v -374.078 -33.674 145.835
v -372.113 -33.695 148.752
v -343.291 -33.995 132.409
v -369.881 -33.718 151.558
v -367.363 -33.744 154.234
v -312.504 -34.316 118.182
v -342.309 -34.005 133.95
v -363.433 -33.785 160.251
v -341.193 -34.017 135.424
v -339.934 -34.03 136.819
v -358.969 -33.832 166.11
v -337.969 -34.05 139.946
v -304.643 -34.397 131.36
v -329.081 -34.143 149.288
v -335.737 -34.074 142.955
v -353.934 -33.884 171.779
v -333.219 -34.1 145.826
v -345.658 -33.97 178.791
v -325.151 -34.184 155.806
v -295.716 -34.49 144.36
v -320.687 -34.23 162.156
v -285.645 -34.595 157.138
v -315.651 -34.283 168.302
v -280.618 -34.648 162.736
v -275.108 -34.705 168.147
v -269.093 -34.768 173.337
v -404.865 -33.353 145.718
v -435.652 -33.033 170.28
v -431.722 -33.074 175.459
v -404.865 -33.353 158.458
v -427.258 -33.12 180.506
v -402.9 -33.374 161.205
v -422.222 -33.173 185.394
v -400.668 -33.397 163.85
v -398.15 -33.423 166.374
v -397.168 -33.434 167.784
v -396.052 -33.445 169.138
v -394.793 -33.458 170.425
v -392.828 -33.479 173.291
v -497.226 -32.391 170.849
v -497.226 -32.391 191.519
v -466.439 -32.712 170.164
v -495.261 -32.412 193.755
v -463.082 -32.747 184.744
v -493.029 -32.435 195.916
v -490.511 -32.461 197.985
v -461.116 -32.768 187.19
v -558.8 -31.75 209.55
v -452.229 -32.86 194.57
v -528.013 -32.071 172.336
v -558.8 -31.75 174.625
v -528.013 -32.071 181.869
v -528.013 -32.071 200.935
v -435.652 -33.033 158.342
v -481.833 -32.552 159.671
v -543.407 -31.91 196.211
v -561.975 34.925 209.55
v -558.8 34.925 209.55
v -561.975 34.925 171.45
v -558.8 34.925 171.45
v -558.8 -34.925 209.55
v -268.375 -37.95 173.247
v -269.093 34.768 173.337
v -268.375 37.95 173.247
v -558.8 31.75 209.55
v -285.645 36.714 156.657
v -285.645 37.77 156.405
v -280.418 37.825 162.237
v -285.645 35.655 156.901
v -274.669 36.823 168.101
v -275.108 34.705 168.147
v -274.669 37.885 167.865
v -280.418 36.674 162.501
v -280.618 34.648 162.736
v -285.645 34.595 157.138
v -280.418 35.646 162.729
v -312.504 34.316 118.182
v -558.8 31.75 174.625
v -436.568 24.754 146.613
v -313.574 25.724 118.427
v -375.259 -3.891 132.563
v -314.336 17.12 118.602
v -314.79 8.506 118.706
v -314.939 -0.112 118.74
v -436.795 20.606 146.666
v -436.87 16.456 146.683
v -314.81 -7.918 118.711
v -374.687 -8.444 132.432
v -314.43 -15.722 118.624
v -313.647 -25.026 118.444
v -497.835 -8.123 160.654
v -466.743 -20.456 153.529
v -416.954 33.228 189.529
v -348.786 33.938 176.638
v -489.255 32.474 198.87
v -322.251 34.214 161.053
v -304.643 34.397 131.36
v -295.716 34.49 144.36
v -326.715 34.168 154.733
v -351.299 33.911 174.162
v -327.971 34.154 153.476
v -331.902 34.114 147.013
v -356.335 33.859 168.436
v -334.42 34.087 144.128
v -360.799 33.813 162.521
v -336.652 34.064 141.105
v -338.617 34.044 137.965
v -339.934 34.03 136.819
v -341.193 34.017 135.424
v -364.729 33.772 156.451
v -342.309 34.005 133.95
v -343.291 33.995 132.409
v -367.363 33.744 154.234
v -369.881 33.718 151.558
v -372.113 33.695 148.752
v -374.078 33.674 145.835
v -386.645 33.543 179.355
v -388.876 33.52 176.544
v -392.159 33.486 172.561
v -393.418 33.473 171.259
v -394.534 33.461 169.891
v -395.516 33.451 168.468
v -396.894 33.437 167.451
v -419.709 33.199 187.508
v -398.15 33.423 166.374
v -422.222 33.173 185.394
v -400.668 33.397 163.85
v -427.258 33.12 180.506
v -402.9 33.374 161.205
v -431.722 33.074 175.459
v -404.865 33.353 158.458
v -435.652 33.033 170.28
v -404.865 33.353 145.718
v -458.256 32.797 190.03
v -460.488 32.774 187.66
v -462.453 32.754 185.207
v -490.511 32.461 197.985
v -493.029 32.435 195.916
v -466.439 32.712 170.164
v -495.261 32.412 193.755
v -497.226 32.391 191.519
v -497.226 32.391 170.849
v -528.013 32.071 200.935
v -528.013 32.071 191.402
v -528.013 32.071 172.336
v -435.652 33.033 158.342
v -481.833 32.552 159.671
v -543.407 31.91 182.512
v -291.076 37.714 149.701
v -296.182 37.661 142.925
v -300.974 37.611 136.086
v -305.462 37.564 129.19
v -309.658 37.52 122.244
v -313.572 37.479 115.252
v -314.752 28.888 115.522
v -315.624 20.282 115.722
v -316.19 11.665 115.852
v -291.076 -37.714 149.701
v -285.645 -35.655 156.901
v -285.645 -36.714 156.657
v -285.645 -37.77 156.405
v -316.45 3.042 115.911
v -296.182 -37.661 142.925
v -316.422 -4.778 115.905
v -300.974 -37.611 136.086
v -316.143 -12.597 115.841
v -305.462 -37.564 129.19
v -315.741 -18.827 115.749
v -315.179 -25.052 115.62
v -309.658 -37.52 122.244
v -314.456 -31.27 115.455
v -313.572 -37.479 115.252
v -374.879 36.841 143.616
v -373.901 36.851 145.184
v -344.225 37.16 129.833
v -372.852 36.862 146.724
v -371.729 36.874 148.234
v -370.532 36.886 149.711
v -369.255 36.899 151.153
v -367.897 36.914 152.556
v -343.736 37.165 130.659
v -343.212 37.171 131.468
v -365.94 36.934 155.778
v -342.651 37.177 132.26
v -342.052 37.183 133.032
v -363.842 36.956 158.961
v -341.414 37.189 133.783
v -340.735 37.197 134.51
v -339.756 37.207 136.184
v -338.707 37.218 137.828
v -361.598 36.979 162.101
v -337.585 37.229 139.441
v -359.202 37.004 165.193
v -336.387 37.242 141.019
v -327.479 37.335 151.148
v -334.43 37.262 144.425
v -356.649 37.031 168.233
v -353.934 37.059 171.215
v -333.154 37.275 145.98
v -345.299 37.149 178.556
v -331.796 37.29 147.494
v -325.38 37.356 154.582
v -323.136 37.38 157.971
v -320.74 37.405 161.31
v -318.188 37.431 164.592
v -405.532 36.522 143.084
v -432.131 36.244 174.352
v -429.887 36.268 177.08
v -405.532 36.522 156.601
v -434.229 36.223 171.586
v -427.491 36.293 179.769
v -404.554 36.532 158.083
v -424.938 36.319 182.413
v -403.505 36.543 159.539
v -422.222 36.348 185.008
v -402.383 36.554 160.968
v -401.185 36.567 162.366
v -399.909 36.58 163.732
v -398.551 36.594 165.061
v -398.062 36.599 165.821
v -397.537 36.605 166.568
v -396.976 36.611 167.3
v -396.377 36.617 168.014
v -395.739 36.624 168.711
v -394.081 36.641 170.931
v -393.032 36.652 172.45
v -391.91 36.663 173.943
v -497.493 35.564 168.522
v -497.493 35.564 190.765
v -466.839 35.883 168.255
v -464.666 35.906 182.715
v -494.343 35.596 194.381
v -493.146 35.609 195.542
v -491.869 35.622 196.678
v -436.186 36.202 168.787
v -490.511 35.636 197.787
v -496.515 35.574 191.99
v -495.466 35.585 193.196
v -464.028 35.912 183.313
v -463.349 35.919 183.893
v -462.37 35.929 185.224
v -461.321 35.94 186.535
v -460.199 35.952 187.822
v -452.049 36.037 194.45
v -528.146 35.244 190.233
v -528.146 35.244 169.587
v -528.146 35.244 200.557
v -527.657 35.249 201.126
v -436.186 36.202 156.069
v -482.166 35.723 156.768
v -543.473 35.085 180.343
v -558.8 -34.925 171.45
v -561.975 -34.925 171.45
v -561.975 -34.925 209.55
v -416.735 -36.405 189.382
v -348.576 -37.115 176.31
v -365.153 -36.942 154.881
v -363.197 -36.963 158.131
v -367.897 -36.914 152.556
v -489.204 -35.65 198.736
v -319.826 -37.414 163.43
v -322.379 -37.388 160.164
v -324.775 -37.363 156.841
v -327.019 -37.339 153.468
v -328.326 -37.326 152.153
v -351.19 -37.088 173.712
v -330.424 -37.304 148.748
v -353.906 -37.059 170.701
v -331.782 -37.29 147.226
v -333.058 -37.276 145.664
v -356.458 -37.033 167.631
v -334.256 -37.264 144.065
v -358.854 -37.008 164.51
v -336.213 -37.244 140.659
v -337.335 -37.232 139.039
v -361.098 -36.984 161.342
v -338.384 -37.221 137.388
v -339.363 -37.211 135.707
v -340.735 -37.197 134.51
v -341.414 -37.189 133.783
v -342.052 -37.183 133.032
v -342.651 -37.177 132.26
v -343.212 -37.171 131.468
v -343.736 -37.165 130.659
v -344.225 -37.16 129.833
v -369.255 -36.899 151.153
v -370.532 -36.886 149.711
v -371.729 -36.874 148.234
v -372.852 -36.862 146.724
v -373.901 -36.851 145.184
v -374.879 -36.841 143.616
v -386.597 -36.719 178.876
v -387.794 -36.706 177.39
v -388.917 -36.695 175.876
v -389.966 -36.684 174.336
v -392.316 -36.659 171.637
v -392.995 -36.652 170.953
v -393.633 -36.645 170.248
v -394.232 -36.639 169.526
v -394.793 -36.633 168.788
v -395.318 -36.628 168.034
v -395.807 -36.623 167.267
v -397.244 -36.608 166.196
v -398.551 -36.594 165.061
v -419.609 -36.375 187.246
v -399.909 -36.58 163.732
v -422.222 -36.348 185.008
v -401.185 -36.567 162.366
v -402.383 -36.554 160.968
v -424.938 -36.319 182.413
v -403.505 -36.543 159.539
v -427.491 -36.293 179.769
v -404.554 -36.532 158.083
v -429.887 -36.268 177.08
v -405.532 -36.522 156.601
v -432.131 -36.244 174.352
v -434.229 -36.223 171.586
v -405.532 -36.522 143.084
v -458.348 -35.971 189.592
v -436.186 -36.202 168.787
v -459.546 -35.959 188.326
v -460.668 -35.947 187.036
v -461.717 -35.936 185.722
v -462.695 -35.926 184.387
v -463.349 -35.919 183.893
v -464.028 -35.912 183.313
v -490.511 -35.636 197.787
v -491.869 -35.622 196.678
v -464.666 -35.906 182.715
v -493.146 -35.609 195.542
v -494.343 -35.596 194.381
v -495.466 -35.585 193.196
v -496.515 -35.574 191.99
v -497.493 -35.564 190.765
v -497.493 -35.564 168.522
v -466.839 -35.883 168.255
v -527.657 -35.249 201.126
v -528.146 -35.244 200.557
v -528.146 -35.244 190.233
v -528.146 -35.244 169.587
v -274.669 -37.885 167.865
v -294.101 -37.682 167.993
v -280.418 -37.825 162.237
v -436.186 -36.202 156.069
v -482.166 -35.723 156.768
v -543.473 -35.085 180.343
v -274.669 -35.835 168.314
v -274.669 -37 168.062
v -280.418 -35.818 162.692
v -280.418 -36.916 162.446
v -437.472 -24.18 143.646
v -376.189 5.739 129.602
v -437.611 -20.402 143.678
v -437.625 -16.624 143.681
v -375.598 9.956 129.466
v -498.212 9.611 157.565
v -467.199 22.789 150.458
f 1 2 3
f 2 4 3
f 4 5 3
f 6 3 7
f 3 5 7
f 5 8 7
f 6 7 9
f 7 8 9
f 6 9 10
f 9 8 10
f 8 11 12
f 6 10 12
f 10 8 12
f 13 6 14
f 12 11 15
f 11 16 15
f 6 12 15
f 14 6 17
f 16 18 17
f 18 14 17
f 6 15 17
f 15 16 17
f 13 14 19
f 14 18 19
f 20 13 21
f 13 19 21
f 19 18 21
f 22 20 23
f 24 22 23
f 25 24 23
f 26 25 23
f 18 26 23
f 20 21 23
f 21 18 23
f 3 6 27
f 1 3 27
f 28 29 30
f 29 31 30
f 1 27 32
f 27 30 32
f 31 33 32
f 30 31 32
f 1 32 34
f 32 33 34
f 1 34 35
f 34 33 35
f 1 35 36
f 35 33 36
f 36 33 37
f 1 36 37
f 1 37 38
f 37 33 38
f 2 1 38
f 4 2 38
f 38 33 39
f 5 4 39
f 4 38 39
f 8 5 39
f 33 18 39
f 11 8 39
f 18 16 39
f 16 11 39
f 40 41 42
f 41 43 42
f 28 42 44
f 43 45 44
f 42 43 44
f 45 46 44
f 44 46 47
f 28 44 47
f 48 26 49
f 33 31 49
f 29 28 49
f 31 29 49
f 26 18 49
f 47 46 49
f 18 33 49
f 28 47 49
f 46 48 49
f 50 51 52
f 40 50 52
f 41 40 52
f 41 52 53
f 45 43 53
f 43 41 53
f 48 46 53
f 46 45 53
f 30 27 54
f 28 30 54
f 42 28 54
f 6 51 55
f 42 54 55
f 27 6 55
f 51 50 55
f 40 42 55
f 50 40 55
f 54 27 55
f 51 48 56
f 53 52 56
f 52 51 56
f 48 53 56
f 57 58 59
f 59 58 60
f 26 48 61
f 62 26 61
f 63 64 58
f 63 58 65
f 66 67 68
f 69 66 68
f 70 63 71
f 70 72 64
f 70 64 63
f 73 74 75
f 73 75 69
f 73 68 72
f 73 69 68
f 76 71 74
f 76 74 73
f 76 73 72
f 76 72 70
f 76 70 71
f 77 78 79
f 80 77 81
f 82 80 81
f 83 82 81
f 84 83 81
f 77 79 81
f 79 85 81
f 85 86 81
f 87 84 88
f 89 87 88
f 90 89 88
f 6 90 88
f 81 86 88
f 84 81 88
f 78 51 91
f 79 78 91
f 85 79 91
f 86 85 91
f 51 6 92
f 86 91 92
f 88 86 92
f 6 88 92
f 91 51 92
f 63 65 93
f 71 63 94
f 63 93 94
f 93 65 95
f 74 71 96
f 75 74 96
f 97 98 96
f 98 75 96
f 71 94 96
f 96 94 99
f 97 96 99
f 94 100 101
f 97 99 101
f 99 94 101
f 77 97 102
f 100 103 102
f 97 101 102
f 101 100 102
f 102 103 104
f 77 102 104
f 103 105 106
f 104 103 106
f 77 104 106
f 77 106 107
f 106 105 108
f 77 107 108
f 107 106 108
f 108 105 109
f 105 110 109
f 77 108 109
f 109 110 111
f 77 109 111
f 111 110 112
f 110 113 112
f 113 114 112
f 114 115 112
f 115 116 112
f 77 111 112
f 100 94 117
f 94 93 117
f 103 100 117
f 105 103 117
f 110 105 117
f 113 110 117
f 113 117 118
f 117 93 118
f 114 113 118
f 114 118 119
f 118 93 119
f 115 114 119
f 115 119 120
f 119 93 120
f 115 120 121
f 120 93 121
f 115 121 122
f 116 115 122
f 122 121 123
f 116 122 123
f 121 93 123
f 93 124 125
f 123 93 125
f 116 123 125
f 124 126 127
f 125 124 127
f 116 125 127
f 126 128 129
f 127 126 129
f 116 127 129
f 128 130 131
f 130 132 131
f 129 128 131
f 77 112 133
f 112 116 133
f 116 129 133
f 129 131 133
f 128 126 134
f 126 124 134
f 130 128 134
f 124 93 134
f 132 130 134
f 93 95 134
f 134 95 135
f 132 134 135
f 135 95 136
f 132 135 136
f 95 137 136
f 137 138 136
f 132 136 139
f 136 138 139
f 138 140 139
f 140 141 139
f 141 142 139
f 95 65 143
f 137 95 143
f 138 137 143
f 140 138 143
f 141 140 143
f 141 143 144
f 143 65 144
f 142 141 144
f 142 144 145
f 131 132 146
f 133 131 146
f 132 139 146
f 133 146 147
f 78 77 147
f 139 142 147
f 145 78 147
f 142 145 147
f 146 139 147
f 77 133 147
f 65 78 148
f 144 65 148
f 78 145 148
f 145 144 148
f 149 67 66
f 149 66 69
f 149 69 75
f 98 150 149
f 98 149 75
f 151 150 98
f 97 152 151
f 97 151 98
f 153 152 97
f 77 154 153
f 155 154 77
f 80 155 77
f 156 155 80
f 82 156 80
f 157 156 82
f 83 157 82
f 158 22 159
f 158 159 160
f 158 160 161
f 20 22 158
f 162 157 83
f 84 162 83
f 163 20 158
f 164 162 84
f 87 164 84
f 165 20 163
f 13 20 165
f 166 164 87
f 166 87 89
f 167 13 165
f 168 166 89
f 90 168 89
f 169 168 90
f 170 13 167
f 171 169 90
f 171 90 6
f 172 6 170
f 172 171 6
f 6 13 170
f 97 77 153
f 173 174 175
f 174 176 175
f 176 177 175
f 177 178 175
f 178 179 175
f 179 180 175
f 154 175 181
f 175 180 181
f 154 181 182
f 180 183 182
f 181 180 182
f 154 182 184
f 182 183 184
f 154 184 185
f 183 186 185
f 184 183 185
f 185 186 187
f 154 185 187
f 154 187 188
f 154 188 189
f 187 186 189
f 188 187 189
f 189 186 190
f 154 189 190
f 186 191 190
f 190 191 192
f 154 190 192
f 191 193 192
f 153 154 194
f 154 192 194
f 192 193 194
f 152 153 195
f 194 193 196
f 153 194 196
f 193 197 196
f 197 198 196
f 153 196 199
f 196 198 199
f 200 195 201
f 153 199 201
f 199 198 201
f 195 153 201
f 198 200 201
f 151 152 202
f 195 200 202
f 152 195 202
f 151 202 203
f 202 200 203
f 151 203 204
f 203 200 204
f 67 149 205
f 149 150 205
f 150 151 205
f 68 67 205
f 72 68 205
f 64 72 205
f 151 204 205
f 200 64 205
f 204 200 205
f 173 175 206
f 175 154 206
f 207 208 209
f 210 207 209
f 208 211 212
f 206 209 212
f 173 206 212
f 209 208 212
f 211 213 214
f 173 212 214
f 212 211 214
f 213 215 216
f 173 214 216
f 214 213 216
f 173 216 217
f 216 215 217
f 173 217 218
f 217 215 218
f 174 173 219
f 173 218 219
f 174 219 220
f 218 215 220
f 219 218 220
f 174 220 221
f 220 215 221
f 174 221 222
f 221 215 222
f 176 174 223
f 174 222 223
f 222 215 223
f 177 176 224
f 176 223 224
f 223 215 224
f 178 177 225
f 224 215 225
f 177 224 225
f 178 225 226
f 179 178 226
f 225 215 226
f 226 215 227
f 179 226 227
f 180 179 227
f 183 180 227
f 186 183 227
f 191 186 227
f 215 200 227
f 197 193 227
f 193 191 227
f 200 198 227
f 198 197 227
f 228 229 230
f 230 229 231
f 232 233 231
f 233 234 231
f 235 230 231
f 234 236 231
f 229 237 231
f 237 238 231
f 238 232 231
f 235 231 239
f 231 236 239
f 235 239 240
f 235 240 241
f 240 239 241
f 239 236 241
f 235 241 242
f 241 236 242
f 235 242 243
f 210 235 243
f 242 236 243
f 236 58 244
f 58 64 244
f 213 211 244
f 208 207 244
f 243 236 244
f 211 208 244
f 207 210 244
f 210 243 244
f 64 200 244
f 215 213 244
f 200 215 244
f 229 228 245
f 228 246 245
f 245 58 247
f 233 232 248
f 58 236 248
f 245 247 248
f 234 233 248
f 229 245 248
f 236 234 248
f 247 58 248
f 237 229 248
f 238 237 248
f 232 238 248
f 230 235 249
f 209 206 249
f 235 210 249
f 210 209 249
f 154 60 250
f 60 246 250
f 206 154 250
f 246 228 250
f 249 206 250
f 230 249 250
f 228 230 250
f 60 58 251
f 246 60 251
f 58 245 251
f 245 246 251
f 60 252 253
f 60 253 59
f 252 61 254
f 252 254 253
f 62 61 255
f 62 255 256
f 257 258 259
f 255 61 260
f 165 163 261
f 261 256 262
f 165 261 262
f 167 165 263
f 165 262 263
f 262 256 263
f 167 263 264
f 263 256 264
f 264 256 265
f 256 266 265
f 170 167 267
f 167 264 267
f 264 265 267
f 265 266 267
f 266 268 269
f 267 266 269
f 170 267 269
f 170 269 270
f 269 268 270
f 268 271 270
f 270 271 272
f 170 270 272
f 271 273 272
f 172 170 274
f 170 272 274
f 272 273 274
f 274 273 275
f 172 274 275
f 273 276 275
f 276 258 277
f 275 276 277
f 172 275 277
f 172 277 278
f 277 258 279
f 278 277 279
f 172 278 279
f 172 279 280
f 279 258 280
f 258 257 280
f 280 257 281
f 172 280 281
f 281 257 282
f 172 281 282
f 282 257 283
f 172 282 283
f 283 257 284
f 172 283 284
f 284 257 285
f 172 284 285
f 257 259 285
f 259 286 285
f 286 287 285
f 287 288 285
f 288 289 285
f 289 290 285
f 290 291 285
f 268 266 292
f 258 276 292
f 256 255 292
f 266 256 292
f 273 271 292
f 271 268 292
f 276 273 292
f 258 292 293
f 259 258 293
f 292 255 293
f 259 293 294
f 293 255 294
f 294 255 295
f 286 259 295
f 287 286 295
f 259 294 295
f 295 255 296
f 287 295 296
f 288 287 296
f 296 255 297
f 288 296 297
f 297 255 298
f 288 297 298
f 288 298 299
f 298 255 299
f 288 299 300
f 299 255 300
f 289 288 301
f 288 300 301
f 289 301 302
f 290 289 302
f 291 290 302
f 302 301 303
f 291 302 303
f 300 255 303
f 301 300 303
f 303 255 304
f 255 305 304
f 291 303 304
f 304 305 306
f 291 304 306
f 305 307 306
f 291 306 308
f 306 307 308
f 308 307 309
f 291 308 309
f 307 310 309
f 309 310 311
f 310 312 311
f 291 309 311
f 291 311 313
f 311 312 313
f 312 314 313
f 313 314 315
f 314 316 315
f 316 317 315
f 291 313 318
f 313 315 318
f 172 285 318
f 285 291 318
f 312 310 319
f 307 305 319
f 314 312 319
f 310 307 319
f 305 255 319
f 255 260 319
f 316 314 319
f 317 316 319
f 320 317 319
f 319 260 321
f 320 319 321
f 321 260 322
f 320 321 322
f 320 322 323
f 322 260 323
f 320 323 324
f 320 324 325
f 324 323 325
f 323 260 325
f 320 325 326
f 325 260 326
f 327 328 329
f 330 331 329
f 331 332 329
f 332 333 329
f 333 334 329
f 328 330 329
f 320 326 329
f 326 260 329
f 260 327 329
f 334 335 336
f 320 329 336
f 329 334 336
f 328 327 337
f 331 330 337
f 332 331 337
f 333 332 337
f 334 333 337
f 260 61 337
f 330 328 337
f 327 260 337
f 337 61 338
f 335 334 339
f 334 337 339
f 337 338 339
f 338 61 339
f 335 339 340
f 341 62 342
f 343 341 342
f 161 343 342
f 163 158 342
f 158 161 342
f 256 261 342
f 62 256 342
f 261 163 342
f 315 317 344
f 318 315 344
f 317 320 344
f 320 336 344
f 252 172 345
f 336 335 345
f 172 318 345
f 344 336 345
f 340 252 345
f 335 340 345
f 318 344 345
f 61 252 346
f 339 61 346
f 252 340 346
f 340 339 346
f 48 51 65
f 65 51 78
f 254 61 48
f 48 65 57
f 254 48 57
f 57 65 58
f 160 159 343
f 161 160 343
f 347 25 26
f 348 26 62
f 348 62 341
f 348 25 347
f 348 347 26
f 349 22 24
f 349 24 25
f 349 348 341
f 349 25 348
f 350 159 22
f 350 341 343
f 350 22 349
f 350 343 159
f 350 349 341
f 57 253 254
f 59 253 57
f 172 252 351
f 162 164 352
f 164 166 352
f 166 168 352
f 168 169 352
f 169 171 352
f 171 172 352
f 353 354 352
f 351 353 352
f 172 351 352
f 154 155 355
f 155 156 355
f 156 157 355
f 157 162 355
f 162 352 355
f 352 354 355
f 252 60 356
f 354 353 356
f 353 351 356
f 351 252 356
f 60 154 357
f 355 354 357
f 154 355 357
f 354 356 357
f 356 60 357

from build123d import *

# Parameters (mm, degrees)
SKETCH113_W  = 69.85
SKETCH113_H  = 38.1
PAD024_DEPTH = 3.175


with BuildPart() as part:
    # Sketch111 → AdditiveLoft001 section 0
    with BuildSketch(Plane(origin=(-254, 0, 101.6), x_dir=(0, 1, 0), z_dir=(1, 0, 0))):
        Polygon((-38.1, 69.85), (-38.1, 0), (38.1, 0), (38.1, 69.8500000001), (34.925, 69.8500000001), (34.925, 3.175), (-34.925, 3.175), (-34.925, 69.85), align=None)
    # Sketch112 → AdditiveLoft001 section 1
    with BuildSketch(Plane(origin=(-558.8, 0, 127), x_dir=(0, 1, 0), z_dir=(1, 0, 0))):
        Polygon((-34.925, 82.55), (-34.925, 44.45), (34.925, 44.45), (34.925, 82.55), (31.75, 82.55), (31.75, 47.625), (-31.75, 47.625), (-31.75, 82.55), align=None)
    loft()

    # Sketch113 (on Face3 of AdditiveLoft001) → Pad024 (new body)
    with BuildSketch(Plane(origin=(-558.8, 0, 101.6), x_dir=(0, 1, 0), z_dir=(-1, 0, 0))):
        with Locations((0, -88.9)):
            Rectangle(SKETCH113_W, SKETCH113_H)
    extrude(amount=PAD024_DEPTH)

    # Sketch114 → Groove (revolve, cut)
    with BuildSketch(Plane.XZ):
        with BuildLine():
            ThreePointArc((-285.6448342114, 160.9012244898), (-330.0079117171, 85.8263739972), (-345.44, 0))
            Line((-345.44, 0), (0, 0))
            Line((0, 203.2), (0, 0))
            Line((-193.3141946016, 203.2), (0, 203.2))
            ThreePointArc((-193.3141946016, 203.2), (-244.0934556744, 192.1220184086), (-285.6448342114, 160.9012244898))
        make_face()
    revolve(axis=Axis((0, 0, 0), (1, 0, 0)), mode=Mode.SUBTRACT)


solid = part.part
